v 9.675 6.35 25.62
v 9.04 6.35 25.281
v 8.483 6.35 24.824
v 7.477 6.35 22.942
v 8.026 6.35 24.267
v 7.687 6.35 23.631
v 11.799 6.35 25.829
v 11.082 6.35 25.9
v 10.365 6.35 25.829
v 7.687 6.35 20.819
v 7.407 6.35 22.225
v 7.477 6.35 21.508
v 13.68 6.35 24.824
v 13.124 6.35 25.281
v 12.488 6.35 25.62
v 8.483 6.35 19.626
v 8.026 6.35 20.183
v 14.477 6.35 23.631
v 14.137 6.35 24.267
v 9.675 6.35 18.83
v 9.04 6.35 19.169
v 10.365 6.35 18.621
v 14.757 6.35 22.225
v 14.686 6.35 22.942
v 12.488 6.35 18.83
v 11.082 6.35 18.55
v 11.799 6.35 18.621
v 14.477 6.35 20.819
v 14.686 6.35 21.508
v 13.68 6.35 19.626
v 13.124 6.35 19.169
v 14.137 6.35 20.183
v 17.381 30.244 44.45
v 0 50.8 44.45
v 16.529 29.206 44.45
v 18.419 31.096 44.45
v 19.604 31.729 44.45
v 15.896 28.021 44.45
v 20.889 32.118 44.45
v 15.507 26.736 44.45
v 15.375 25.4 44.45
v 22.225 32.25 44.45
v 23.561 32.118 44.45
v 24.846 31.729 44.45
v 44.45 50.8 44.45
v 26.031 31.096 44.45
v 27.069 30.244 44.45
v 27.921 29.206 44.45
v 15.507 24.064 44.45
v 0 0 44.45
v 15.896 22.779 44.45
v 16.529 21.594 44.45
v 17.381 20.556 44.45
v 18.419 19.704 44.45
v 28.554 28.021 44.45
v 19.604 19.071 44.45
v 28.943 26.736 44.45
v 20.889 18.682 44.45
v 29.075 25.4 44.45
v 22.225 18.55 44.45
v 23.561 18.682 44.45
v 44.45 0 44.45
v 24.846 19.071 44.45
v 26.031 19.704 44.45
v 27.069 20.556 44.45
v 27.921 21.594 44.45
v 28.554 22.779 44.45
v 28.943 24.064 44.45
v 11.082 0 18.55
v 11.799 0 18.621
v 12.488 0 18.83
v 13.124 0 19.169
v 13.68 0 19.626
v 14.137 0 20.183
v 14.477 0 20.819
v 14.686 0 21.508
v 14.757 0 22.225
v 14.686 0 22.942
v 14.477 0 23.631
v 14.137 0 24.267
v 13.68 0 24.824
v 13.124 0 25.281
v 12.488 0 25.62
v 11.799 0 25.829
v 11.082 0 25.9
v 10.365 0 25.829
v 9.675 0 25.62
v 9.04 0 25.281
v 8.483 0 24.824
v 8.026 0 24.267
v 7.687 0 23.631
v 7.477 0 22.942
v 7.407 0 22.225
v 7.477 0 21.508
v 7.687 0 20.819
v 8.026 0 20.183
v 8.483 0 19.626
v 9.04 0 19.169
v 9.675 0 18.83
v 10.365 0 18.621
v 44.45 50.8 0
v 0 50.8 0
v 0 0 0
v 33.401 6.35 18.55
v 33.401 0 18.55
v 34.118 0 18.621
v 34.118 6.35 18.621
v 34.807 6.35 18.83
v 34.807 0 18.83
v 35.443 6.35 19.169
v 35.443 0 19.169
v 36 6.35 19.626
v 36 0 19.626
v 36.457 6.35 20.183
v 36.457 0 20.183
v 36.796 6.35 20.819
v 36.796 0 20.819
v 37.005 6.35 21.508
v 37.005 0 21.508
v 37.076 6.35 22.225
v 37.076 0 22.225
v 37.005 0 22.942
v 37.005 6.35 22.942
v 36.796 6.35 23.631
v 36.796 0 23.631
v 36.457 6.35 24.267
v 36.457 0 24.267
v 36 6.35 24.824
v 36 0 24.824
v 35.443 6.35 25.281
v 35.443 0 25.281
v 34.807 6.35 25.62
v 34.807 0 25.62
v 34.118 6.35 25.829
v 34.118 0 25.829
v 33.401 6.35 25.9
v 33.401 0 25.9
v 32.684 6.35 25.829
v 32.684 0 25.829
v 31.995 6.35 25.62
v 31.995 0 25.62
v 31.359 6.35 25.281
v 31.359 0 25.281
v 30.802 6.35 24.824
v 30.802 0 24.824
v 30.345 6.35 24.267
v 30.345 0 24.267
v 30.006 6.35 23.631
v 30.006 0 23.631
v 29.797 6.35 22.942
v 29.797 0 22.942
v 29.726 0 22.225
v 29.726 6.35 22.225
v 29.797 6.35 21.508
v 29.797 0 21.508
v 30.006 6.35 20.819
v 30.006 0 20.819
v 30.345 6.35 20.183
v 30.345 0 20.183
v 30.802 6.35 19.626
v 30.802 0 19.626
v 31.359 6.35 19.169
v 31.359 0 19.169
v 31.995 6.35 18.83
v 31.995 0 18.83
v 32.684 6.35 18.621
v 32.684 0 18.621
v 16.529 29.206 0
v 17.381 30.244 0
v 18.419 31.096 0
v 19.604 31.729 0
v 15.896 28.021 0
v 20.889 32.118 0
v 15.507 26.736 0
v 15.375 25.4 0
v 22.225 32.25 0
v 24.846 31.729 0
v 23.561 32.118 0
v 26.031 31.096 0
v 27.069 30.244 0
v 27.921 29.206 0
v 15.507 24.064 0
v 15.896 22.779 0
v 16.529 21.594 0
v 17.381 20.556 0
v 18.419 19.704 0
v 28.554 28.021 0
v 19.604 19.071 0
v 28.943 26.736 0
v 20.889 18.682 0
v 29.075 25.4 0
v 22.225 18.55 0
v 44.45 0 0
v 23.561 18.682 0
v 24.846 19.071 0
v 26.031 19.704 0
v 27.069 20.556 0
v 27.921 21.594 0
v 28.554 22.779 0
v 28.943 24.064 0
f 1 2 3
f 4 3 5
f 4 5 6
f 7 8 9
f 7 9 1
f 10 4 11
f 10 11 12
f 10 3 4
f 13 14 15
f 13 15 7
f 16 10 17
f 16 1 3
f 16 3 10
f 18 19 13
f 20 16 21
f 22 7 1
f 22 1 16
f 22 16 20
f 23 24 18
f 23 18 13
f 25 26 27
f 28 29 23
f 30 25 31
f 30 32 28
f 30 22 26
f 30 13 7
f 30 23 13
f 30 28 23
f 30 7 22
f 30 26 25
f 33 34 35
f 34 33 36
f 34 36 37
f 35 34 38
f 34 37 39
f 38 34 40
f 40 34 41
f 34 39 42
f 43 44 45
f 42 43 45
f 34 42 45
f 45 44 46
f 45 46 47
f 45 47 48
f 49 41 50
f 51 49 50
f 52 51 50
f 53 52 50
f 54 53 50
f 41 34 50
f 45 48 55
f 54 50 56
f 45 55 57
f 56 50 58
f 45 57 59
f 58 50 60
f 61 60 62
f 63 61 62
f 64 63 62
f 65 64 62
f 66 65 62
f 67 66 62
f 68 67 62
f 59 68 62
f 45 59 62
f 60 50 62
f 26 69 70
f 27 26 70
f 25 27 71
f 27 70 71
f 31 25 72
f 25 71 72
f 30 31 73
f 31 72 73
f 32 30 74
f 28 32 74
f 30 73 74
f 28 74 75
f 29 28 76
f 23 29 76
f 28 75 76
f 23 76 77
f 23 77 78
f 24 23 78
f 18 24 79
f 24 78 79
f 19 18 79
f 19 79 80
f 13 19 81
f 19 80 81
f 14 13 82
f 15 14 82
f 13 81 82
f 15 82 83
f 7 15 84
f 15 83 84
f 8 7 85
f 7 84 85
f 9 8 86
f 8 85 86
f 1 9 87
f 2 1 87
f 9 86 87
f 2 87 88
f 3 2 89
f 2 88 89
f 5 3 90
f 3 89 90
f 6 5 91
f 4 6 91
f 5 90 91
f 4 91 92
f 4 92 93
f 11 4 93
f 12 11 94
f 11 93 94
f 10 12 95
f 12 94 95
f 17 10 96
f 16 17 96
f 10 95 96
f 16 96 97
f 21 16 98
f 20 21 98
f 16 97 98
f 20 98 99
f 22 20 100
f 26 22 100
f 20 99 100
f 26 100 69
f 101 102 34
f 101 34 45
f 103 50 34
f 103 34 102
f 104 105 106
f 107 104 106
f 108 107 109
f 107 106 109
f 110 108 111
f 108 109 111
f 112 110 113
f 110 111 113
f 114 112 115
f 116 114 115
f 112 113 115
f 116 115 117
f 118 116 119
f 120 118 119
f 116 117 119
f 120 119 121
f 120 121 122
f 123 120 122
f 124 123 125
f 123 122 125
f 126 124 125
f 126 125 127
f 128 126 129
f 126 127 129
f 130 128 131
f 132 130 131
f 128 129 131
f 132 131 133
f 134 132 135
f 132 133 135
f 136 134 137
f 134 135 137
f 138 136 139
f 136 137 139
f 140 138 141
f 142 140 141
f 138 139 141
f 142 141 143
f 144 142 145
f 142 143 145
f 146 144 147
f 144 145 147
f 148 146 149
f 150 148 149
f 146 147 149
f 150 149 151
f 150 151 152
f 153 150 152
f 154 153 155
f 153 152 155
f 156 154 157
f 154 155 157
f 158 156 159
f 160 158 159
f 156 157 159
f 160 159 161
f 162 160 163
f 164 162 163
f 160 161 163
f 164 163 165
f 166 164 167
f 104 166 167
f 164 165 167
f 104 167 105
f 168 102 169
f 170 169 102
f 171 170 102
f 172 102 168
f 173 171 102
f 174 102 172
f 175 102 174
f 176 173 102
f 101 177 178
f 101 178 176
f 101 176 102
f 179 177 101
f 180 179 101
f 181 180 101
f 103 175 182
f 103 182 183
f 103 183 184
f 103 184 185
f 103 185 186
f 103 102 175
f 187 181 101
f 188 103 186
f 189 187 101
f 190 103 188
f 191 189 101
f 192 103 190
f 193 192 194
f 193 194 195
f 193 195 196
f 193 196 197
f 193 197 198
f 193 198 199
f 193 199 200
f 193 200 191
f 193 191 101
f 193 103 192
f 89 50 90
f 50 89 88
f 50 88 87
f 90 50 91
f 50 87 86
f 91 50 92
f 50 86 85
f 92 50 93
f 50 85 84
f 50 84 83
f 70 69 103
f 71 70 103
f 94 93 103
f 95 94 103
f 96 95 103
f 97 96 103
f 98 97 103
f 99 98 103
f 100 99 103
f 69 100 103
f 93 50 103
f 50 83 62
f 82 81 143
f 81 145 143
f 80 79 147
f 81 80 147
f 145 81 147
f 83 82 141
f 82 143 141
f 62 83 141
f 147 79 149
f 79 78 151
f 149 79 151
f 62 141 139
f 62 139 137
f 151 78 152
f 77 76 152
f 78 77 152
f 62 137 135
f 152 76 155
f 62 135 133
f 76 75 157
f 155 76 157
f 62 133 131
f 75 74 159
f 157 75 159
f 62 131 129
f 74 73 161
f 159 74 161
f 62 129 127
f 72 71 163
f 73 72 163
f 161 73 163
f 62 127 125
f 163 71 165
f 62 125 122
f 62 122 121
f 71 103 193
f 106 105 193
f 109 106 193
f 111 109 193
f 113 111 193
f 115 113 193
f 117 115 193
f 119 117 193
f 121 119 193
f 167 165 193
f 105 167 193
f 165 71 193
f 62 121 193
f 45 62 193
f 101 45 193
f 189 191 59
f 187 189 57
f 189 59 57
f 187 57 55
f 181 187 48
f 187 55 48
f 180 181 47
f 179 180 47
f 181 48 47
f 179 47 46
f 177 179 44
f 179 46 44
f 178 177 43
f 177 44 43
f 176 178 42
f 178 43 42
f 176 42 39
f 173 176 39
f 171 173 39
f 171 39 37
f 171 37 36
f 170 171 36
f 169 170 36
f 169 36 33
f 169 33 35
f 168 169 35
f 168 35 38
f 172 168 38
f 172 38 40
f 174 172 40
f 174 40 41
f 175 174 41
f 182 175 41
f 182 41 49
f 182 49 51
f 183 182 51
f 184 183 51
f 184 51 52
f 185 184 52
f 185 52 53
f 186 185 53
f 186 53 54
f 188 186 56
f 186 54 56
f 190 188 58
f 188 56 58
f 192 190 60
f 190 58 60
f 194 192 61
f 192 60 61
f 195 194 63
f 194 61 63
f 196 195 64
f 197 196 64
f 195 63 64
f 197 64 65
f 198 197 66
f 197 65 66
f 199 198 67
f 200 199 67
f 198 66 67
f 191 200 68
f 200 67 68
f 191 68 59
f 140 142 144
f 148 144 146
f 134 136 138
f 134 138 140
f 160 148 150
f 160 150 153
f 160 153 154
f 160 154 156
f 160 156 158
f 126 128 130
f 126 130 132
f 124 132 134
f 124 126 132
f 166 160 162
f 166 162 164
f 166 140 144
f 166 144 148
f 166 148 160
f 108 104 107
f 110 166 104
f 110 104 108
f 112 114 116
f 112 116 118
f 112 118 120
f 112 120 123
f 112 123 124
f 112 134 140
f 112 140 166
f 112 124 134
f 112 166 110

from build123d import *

# Parameters (mm, degrees)
SKETCH2_W           = 44.45
SKETCH2_H           = 44.45
BOSS_EXTRUDE1_DEPTH = 50.8
SKETCH3_R           = 6.849999
CUT_EXTRUDE1_DEPTH  = 50.8
SKETCH4_R           = 3.674999
CUT_EXTRUDE2_DEPTH  = 6.35


with BuildPart() as part:
    # Sketch2 → Boss-Extrude1 (new body)
    with BuildSketch(Plane(origin=(0, 0, 0), x_dir=(1, 0, 0), z_dir=(0, 1, 0))):
        with Locations((22.225, -22.225)):
            Rectangle(SKETCH2_W, SKETCH2_H)
    extrude(amount=BOSS_EXTRUDE1_DEPTH)

    # Sketch3 → Cut-Extrude1 (cut)
    with BuildSketch(Plane.XY.offset(44.45)):
        with Locations((22.225, 25.4)):
            Circle(SKETCH3_R)
    extrude(amount=-CUT_EXTRUDE1_DEPTH, mode=Mode.SUBTRACT)

    # Sketch4 → Cut-Extrude2 (cut)
    with BuildSketch(Plane.XZ):
        with Locations(Location((11.08184529, 22.225, 0), (0, 0, 270))):  # turned: the seam where the file's is
            Circle(SKETCH4_R)
        with Locations(Location((33.401, 22.225, 0), (0, 0, 270))):  # turned: the seam where the file's is
            Circle(SKETCH4_R)
    extrude(amount=-CUT_EXTRUDE2_DEPTH, mode=Mode.SUBTRACT)


solid = part.part
